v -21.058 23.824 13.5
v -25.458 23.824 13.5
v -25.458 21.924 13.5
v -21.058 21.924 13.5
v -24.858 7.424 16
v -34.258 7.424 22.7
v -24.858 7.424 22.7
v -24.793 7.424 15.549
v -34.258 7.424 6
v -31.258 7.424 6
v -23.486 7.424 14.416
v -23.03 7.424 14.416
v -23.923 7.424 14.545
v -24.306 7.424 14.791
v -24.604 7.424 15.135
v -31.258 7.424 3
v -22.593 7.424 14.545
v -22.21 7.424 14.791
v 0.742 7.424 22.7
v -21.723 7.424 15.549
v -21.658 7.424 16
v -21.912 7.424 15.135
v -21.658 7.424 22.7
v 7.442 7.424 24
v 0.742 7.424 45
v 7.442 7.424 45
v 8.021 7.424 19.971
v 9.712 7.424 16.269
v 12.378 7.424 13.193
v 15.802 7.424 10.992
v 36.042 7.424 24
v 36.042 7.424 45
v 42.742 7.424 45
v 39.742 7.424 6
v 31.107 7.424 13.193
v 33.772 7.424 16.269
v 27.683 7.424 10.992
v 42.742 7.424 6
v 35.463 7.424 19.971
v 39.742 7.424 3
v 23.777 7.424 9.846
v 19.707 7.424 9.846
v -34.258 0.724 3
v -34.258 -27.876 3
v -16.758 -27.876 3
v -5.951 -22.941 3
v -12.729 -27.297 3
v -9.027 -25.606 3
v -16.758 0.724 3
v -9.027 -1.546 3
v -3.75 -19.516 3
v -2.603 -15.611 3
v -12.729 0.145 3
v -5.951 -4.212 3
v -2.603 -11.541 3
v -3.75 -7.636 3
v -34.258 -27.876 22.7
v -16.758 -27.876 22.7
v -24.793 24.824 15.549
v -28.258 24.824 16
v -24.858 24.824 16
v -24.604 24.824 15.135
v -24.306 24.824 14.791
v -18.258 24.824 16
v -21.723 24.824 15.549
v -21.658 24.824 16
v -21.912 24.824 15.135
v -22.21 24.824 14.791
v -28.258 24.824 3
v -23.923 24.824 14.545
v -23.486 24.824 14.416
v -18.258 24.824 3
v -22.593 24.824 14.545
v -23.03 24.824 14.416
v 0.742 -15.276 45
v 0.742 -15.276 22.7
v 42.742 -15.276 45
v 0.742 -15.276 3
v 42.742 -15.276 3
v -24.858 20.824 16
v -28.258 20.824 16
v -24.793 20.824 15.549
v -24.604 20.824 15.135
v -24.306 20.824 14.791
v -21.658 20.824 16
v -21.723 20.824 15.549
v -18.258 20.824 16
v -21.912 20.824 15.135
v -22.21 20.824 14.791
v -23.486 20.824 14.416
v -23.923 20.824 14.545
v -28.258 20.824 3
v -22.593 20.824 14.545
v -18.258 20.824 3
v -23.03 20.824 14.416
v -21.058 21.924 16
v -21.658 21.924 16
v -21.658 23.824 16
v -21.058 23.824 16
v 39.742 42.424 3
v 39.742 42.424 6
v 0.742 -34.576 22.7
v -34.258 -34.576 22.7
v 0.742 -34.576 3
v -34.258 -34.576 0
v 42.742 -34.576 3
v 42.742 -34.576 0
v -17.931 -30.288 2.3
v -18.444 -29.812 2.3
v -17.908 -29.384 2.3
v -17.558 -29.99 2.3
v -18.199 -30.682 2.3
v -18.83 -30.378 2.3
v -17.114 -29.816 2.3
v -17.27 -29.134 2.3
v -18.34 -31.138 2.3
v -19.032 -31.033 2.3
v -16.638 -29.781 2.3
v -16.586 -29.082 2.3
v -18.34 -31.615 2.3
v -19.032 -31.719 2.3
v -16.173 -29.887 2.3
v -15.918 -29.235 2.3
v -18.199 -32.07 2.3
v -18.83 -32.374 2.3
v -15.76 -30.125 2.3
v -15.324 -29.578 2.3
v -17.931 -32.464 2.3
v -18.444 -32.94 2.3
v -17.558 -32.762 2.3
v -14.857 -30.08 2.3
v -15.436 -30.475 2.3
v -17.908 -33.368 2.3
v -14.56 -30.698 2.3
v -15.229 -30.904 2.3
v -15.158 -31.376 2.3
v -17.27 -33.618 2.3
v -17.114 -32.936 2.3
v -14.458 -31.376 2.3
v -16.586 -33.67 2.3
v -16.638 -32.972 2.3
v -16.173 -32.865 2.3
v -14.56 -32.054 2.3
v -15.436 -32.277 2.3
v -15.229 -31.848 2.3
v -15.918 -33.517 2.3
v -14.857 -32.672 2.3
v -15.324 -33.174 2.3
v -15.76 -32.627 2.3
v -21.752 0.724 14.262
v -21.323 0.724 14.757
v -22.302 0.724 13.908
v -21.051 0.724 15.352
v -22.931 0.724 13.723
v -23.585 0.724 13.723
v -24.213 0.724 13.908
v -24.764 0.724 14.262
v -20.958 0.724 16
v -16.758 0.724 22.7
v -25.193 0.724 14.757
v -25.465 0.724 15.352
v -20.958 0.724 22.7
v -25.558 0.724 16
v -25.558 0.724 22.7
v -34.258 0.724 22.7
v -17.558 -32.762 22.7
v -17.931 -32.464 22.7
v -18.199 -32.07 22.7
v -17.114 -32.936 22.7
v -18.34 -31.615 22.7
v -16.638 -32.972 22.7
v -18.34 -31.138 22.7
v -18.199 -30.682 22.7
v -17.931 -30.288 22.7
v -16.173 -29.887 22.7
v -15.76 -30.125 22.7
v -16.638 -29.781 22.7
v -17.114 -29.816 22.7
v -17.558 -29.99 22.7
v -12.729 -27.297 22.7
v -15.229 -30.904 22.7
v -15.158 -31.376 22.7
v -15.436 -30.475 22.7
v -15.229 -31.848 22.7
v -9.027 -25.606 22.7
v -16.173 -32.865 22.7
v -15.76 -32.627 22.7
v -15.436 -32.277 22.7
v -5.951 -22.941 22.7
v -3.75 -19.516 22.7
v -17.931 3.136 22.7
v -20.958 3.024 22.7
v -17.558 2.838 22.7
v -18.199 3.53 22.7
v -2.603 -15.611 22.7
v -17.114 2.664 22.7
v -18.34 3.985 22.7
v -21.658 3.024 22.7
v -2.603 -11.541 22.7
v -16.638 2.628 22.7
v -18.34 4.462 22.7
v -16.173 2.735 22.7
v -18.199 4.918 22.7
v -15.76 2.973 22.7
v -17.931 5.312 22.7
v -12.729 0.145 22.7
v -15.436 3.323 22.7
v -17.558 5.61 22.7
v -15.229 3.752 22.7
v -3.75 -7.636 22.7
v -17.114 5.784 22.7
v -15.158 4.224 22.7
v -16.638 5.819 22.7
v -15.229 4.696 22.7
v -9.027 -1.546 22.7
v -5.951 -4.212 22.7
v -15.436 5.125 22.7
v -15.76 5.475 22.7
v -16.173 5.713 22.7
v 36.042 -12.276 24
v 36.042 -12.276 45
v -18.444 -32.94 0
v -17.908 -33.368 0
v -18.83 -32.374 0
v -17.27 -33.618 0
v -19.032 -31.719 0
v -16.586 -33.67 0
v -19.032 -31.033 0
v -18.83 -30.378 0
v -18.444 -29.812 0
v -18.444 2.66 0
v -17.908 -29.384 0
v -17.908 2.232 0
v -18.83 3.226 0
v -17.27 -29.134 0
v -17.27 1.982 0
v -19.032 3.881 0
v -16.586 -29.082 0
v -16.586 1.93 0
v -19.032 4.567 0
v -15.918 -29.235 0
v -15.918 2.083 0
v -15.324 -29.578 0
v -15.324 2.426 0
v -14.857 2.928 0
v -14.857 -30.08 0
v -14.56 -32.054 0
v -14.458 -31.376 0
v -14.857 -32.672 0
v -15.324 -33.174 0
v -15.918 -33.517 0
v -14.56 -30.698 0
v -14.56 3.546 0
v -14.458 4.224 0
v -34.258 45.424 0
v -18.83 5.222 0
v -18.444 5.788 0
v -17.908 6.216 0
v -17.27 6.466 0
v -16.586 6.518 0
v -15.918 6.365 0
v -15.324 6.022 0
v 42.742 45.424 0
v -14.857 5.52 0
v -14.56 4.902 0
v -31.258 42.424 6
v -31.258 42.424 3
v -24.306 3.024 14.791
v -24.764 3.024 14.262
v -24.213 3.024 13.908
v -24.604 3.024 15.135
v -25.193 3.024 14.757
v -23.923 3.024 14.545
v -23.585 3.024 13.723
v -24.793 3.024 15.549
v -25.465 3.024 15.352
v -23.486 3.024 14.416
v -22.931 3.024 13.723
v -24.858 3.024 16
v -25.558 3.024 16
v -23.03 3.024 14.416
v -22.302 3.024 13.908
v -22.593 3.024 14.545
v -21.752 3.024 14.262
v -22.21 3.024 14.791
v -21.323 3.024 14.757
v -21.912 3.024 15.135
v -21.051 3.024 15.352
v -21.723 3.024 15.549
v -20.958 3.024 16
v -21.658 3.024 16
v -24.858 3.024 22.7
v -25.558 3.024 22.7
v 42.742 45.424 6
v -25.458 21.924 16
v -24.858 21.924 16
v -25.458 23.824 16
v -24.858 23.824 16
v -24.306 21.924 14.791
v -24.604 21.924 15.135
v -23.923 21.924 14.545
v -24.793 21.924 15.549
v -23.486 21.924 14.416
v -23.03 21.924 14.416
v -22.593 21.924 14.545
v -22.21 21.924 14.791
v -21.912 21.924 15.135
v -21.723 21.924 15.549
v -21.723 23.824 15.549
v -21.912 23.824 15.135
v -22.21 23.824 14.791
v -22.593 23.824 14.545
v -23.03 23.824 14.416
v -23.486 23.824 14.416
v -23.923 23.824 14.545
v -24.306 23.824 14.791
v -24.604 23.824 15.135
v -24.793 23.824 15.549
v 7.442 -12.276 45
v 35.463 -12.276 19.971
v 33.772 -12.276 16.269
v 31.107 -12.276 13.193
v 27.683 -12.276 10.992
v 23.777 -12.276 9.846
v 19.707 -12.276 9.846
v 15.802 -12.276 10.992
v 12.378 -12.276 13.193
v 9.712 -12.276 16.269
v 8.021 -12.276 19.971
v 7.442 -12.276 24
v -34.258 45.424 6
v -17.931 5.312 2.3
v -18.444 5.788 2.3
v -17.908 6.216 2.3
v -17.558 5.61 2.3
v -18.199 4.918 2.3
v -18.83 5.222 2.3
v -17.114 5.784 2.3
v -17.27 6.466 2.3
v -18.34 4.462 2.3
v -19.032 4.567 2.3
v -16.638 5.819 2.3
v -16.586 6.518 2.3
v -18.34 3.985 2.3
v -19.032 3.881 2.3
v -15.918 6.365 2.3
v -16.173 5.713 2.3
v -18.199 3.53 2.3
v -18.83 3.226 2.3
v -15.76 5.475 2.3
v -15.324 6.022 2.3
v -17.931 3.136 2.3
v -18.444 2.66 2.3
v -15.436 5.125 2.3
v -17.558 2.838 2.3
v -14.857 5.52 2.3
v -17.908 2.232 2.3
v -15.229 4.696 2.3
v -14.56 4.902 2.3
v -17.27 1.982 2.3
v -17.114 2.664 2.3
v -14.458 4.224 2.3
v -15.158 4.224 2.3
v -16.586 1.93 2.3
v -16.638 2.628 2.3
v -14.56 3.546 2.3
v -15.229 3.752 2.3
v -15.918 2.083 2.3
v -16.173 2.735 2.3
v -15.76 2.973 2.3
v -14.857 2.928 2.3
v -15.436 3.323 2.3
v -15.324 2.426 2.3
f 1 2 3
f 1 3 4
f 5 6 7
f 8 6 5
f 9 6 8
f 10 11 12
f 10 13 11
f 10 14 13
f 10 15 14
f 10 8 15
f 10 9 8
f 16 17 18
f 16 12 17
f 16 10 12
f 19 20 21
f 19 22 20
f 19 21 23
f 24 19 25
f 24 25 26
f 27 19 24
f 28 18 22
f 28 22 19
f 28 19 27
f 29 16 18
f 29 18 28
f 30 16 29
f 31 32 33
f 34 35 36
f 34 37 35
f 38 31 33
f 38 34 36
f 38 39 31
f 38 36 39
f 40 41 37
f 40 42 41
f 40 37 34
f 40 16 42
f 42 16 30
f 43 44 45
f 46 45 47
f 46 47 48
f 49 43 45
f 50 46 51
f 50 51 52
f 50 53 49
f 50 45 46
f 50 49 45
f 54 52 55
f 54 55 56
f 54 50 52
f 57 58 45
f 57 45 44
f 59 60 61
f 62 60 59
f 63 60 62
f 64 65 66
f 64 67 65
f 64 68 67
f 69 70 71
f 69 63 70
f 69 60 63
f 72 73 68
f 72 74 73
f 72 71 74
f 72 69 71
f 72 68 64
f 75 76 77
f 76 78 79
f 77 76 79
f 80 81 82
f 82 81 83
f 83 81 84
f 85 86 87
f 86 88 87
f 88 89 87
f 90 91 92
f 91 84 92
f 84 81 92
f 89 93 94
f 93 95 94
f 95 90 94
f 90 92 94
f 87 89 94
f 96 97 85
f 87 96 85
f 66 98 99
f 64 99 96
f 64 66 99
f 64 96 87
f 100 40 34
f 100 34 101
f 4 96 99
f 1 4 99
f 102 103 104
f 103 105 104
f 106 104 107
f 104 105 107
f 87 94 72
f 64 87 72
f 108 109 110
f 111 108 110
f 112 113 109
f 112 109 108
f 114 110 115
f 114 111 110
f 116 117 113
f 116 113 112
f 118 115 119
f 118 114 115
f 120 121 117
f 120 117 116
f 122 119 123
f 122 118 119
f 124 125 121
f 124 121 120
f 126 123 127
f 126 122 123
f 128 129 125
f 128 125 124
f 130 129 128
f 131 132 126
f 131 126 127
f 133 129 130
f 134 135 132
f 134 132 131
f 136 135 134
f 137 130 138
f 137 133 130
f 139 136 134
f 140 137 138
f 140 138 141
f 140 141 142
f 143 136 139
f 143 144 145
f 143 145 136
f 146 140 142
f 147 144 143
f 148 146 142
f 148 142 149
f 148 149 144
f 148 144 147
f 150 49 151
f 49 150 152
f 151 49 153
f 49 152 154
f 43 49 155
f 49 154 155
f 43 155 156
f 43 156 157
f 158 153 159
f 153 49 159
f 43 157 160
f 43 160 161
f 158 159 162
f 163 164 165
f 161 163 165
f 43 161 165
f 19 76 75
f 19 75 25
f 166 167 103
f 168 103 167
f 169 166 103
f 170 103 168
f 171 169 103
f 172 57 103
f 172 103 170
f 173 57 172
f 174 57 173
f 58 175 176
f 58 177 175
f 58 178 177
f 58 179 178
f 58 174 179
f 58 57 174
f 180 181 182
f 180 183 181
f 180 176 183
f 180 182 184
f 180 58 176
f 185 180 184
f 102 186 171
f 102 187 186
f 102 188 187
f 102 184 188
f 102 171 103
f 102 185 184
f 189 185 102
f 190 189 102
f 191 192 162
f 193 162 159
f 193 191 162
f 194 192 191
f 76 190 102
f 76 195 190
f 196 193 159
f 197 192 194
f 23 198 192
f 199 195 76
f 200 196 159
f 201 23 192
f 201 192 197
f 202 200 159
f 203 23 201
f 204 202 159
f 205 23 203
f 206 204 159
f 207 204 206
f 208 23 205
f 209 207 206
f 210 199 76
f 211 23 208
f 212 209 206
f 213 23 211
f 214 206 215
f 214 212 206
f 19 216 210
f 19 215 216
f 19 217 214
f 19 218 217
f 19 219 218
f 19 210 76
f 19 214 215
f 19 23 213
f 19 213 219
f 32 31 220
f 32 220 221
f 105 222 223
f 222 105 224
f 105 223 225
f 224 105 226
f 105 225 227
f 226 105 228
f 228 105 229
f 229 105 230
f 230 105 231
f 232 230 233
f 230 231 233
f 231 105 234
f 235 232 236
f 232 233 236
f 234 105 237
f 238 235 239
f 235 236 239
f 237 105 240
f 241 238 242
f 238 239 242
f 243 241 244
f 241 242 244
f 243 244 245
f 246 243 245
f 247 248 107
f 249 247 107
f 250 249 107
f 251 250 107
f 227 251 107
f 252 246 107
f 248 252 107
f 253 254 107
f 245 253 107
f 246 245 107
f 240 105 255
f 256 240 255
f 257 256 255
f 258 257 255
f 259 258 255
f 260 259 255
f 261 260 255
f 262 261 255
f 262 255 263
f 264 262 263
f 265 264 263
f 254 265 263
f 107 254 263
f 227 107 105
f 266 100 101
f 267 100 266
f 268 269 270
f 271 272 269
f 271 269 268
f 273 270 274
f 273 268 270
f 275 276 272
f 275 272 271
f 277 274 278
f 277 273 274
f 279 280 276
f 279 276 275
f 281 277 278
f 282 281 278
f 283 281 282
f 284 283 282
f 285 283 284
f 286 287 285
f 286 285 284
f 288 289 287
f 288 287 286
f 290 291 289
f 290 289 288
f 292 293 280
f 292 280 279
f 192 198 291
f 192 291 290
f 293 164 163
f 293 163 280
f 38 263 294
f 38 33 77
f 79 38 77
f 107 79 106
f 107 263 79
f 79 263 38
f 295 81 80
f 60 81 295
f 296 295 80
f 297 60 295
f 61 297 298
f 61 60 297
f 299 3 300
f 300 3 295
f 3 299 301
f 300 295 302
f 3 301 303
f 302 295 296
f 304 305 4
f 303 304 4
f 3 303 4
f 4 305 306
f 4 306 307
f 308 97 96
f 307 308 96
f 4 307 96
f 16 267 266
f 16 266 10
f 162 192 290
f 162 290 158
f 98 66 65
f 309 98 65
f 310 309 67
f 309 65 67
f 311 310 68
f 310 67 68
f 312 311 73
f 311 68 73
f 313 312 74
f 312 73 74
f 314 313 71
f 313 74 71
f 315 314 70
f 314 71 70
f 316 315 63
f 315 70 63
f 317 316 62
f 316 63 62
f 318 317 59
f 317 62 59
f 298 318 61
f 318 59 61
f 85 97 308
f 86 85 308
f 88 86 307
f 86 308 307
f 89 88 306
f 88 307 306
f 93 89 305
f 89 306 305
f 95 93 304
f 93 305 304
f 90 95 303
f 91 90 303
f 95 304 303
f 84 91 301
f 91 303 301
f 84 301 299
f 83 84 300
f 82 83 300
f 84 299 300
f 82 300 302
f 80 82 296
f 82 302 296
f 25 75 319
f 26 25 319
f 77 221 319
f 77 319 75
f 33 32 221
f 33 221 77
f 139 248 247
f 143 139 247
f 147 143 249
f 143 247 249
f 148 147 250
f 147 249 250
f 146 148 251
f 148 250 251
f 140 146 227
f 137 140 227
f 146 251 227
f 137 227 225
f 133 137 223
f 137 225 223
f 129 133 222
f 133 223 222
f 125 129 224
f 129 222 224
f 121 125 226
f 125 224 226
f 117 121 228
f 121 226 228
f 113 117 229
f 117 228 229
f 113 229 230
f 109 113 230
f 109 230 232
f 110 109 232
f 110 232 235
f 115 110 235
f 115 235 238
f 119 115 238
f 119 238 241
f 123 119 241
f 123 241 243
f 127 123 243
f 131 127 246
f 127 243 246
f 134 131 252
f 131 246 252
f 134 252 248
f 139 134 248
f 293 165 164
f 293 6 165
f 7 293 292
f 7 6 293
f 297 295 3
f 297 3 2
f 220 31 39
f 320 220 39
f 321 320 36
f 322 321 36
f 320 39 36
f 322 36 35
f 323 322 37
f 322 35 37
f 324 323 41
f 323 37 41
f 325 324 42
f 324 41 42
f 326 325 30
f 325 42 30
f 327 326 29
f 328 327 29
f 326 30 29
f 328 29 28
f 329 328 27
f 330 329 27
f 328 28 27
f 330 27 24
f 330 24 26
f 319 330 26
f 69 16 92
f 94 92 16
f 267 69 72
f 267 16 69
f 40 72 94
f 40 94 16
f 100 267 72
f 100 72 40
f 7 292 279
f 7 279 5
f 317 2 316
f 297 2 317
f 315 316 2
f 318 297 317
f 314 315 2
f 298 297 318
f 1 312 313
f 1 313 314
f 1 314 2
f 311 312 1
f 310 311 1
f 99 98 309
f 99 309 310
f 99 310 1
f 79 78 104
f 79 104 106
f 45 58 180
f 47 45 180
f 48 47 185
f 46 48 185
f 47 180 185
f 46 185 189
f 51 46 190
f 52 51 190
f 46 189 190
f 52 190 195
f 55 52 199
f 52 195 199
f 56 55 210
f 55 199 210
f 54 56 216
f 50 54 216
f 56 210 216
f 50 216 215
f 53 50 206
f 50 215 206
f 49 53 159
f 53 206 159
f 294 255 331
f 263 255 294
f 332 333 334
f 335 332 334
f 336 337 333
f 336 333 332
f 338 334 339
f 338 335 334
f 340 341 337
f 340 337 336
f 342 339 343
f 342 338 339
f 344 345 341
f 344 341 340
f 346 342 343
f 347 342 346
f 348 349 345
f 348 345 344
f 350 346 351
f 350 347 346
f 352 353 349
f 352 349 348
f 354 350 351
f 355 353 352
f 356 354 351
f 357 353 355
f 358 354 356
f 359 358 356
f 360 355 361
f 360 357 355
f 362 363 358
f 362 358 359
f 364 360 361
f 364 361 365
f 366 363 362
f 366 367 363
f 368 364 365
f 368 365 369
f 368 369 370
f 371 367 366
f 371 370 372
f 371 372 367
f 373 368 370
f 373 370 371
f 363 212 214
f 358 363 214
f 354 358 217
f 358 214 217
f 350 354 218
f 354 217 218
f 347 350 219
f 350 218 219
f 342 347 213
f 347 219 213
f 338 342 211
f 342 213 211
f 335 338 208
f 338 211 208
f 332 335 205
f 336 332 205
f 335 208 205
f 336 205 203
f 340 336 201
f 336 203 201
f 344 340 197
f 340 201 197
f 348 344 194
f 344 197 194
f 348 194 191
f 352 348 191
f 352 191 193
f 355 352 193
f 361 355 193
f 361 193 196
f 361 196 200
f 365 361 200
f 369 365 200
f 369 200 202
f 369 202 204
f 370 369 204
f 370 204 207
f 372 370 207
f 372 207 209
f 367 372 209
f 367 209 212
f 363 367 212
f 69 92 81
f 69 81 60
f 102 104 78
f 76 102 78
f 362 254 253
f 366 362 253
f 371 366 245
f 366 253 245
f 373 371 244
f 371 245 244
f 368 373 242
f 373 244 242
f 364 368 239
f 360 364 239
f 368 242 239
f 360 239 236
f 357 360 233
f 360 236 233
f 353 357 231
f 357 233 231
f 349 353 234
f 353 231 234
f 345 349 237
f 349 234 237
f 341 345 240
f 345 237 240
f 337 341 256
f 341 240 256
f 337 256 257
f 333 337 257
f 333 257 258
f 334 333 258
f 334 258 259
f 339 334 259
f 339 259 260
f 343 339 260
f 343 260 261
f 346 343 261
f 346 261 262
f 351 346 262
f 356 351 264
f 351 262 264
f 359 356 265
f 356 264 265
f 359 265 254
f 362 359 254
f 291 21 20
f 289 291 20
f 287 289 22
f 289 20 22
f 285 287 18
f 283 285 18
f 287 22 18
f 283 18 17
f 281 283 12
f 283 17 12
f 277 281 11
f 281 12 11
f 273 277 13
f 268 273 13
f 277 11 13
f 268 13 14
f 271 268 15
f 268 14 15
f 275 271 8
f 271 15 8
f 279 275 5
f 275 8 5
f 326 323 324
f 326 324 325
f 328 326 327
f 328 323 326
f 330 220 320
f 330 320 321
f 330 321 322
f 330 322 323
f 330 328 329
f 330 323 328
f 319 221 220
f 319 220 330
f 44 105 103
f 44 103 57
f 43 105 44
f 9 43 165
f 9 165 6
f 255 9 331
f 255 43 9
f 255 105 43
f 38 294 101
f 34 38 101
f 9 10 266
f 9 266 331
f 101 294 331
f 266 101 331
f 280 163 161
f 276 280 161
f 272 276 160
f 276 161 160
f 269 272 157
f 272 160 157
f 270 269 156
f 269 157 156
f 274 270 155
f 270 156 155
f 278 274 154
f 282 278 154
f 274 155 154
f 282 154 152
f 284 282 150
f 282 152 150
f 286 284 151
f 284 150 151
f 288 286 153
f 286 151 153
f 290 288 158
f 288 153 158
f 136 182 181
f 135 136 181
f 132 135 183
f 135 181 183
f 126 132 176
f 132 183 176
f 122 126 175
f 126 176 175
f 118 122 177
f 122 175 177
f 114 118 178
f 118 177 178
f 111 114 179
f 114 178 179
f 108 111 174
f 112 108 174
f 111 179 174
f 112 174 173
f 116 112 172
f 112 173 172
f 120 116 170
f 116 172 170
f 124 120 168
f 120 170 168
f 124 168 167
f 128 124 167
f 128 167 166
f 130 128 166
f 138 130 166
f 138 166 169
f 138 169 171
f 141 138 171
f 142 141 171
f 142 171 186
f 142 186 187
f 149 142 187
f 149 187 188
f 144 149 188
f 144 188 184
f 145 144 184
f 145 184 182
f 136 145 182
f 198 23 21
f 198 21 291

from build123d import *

# Parameters (mm, degrees)
SKETCH_W        = 77
SKETCH_H        = 80
PAD_DEPTH       = 3
SKETCH001_W     = 35
SKETCH001_H     = 42
PAD001_DEPTH    = 19.7
POCKET_DEPTH    = 19.7
SKETCH003_W     = 42
SKETCH003_H     = 22.7
PAD002_DEPTH    = 42
POCKET001_DEPTH = 19.7
SKETCH006_R     = 1.6
POCKET002_DEPTH = 8
SKETCH007_R     = 2.3
POCKET003_DEPTH = 2.3
SKETCH008_W     = 10
SKETCH008_H     = 4
PAD003_DEPTH    = 13
POCKET004_DEPTH = 4
POCKET005_DEPTH = 6.7
SKETCH011_W     = 4.4
SKETCH011_H     = 1.9
POCKET006_DEPTH = 2.5
SKETCH012_R     = 1.6
POCKET007_DEPTH = 22.701
PAD004_DEPTH    = 3
SKETCH014_R     = 2.3
POCKET008_DEPTH = 2.3


with BuildPart() as part:
    # Sketch → Pad (new body)
    with BuildSketch(Plane.XY):
        with Locations((4.24216, 5.423944)):
            Rectangle(SKETCH_W, SKETCH_H)
    extrude(amount=PAD_DEPTH)

    # Sketch001 → Pad001 (new body)
    with BuildSketch(Plane.XY.offset(3)):
        with Locations((-16.75784, -13.576056)):
            Rectangle(SKETCH001_W, SKETCH001_H)
    extrude(amount=PAD001_DEPTH)

    # Sketch002 → Pocket (cut)
    with BuildSketch(Plane.XY.offset(22.7)):
        with BuildLine():
            ThreePointArc((-16.75784, -27.876056), (-2.45784, -13.576056), (-16.75784, 0.723944))
            Line((-16.75784, 0.723944), (-34.25784, 0.723944))
            Line((-34.25784, -27.876057), (-34.25784, 0.723944))
            Line((-16.75784, -27.876056), (-34.25784, -27.876057))
        make_face()
    extrude(amount=-POCKET_DEPTH, mode=Mode.SUBTRACT)

    # Sketch003 → Pad002 (new body)
    with BuildSketch(Plane.XY.offset(3)):
        with Locations((21.74216, -3.926056)):
            Rectangle(SKETCH003_W, SKETCH003_H)
    extrude(amount=PAD002_DEPTH)

    # Sketch004 → Pocket001 (cut)
    with BuildSketch(Plane(origin=(0, 7.423944, 0), x_dir=(-1, 0, 0), z_dir=(0, 1, 0))):
        with BuildLine():
            ThreePointArc((-36.04216, 24), (-21.74216, 9.7), (-7.44216, 24))
            Line((-7.44216, 24), (-7.44216, 45))
            Line((-36.04216, 45), (-7.44216, 45))
            Line((-36.04216, 24), (-36.04216, 45))
        make_face()
    extrude(amount=-POCKET001_DEPTH, mode=Mode.SUBTRACT)

    # Sketch006 → Pocket002 (cut)
    with BuildSketch(Plane(origin=(0, 7.423944, 0), x_dir=(-1, 0, 0), z_dir=(0, 1, 0))):
        with Locations((23.25784, 16)):
            Circle(SKETCH006_R)
    extrude(amount=-POCKET002_DEPTH, mode=Mode.SUBTRACT)

    # Sketch007 → Pocket003 (cut)
    with BuildSketch(Plane.XZ.offset(-0.723944)):
        with Locations((-23.25784, 16)):
            Circle(SKETCH007_R)
    extrude(amount=-POCKET003_DEPTH, mode=Mode.SUBTRACT)

    # Sketch008 → Pad003 (new body)
    with BuildSketch(Plane.XY.offset(3)):
        with Locations((-23.25784, 22.823944)):
            Rectangle(SKETCH008_W, SKETCH008_H)
    extrude(amount=PAD003_DEPTH)

    # Sketch009 → Pocket004 (cut)
    with BuildSketch(Plane(origin=(0, 24.823944, 0), x_dir=(-1, 0, 0), z_dir=(0, 1, 0))):
        with BuildLine():
            ThreePointArc((21.65784, 16), (23.25784, 14.4), (24.85784, 16))
            Line((21.65784, 16), (24.85784, 16))
        make_face()
    extrude(amount=-POCKET004_DEPTH, mode=Mode.SUBTRACT)

    # Sketch010 → Pocket005 (cut)
    with BuildSketch(Plane.XY.offset(22.7)):
        Polygon((-24.85784, 7.423944), (-21.65784, 7.423944), (-21.65784, 3.023944), (-20.95784, 3.023944), (-20.95784, 0.723944), (-25.55784, 0.723944), (-25.55784, 3.023944), (-24.85784, 3.023944), align=None)
    extrude(amount=-POCKET005_DEPTH, mode=Mode.SUBTRACT)

    # Sketch011 → Pocket006 (cut)
    with BuildSketch(Plane.XY.offset(16)):
        with Locations((-23.25784, 22.873944)):
            Rectangle(SKETCH011_W, SKETCH011_H)
    extrude(amount=-POCKET006_DEPTH, mode=Mode.SUBTRACT)

    # Sketch012 → Pocket007 (cut, through all)
    with BuildSketch(Plane.XY.offset(22.7)):
        with Locations((-16.75784, -31.376056)):
            Circle(SKETCH012_R)
        with Locations((-16.75784, 4.223944)):
            Circle(SKETCH012_R)
    extrude(amount=-POCKET007_DEPTH, mode=Mode.SUBTRACT)

    # Sketch013 → Pad004 (new body)
    with BuildSketch(Plane.XY.offset(3)):
        Polygon((-34.25784, 7.423944), (-34.25784, 45.423944), (42.74216, 45.423944), (42.74216, 7.423944), (39.74216, 7.423944), (39.74216, 42.423944), (-31.25784, 42.423944), (-31.25784, 7.423944), align=None)
    extrude(amount=PAD004_DEPTH)

    # Sketch014 → Pocket008 (cut)
    with BuildSketch(Plane(origin=(0, 0, 0), x_dir=(1, 0, 0), z_dir=(0, 0, -1))):
        with Locations((-16.75784, 31.376056)):
            Circle(SKETCH014_R)
        with Locations((-16.75784, -4.223944)):
            Circle(SKETCH014_R)
    extrude(amount=-POCKET008_DEPTH, mode=Mode.SUBTRACT)


solid = part.part
